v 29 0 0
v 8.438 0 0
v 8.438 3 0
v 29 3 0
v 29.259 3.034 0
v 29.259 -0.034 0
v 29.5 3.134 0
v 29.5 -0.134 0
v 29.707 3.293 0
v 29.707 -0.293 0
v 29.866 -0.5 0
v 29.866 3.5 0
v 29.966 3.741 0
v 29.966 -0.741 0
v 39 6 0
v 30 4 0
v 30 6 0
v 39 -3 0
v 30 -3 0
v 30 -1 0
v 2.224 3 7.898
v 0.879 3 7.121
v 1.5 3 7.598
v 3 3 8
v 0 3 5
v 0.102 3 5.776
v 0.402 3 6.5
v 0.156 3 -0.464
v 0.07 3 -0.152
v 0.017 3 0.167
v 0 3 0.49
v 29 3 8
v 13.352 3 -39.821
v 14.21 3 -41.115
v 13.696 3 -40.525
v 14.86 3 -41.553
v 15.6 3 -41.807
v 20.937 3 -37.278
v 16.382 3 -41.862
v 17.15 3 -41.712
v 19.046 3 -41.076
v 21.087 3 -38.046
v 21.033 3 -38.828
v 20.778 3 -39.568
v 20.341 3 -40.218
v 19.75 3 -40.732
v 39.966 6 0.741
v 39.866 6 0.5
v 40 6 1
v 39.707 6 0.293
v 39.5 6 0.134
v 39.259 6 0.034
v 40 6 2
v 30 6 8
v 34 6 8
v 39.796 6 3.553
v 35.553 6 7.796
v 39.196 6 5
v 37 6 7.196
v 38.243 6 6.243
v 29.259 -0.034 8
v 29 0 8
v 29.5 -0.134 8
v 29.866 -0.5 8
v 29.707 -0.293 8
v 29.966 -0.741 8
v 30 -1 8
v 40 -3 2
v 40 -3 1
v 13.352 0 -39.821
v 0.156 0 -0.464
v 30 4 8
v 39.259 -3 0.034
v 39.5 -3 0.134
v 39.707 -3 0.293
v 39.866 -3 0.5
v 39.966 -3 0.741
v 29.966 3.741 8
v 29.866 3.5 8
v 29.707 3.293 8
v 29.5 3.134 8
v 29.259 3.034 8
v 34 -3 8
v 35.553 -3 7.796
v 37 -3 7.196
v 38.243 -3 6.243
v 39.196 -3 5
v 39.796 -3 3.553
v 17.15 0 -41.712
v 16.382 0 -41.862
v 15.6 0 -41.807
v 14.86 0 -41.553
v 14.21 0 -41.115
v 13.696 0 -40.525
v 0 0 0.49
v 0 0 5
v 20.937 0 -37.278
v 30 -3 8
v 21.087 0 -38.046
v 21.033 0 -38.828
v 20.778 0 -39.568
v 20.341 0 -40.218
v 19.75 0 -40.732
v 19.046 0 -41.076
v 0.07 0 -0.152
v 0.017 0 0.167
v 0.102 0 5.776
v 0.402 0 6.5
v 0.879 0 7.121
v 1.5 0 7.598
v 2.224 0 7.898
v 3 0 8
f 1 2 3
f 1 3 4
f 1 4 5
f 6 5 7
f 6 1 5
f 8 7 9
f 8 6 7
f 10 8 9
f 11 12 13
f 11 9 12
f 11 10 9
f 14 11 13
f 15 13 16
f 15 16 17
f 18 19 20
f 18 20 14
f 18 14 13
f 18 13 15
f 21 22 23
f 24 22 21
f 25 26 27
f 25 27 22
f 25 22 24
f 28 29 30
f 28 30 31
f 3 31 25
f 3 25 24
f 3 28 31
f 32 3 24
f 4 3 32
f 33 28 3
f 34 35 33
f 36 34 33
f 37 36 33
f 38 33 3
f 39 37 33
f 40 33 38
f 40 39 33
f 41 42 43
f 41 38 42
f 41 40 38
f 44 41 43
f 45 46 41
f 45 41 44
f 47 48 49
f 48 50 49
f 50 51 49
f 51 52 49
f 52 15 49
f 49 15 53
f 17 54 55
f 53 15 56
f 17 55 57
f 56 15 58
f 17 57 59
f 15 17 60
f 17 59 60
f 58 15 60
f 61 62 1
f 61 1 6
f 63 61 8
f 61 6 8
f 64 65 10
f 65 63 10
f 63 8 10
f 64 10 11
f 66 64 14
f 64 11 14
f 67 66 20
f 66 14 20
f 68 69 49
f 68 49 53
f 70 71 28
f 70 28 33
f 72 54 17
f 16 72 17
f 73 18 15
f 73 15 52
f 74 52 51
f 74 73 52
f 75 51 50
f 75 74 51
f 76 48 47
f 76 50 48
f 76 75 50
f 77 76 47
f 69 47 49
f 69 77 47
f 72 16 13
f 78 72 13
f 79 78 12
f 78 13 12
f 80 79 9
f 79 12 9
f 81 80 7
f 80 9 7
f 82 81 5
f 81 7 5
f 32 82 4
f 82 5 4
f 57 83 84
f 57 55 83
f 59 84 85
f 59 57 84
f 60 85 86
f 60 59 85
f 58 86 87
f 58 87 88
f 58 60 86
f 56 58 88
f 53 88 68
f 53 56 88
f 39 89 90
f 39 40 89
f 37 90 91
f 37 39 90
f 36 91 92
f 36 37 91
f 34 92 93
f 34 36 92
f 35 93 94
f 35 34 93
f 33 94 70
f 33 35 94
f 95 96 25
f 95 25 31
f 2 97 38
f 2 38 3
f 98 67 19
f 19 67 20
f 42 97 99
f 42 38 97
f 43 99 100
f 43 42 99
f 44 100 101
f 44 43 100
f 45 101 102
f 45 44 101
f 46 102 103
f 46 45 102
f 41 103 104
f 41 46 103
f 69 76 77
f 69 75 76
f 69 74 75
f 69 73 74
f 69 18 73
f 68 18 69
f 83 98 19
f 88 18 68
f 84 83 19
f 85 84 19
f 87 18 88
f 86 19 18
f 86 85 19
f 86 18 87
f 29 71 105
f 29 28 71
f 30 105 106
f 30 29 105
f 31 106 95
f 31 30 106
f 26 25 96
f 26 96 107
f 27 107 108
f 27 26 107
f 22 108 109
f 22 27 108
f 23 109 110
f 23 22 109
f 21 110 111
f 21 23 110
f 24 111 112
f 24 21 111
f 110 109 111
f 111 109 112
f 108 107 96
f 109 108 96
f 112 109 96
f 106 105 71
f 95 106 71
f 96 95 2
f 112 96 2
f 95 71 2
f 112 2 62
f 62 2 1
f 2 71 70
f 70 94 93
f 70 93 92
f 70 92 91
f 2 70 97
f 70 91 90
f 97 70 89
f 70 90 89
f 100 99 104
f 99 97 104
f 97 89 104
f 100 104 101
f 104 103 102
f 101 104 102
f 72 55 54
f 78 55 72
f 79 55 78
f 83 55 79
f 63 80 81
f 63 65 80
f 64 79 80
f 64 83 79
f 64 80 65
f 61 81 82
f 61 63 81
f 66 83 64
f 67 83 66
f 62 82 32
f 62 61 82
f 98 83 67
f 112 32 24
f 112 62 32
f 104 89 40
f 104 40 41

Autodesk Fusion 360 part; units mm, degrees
sketch "Sketch1" plane through (0, 0, 0) normal (0, 1, 0) x (1, 0, 0)
  line L0 (0, 0) -> (40, 0)
  line L1 (40, 0) -> (40, -8)
  line L2 (40, -8) -> (0, -8)
  line L3 (0, -8) -> (0, 0)
  line L4 (0, 0) -> (14.3059, 42.6654)
  line L5 (14.3059, 42.6654) -> (21.8909, 40.1222)
  line L6 (21.8909, 40.1222) -> (8.4377, 0)
  dimension "d1" = 40
  dimension "d2" = 8
  dimension "d4" = 8
  dimension "d5" = 71.463
  dimension "d9" = 45
extrude "Extrude3" add sketch "Sketch1" along normal blind 3
fillet "Fillet8" radius 3 4 edges at (0, 1.5, 8) (0, 1.5, 0) (14.3059, 1.5, -42.6654) (21.8909, 1.5, -40.1222)
sketch "Sketch4" plane through (0, 0, 0) normal (0, -1, 0) x (1, 0, 0)
  arc A0 (19.0465, -41.0759) -> (20.9372, -37.2778) centre (18.0928, -38.2315) ccw
  line L0 (20.9372, -37.2778) -> (8.4377, 0)
  line L1 (8.4377, 0) -> (40, 0)
  line L2 (40, 0) -> (40, 8)
  line L3 (40, 8) -> (3, 8)
  arc A1 (3, 8) -> (0, 5) centre (3, 5) ccw
  line L4 (0, 5) -> (0, 0.4896)
  arc A2 (0, 0.4896) -> (0.1556, -0.4642) centre (3, 0.4896) ccw
  line L5 (0.1556, -0.4642) -> (13.3522, -39.8211)
  arc A3 (13.3522, -39.8211) -> (17.1503, -41.7117) centre (16.1966, -38.8674) ccw
  line L6 (17.1503, -41.7117) -> (19.0465, -41.0759)
  line L7 (40, 8) -> (30, 8)
  line L8 (30, 8) -> (30, 0)
  line L9 (30, 0) -> (40, 0)
  line L10 (40, 0) -> (40, 8)
  dimension "d26" = 10
extrude "Extrude4" add sketch "Sketch4" along normal blind 3 and the other way blind 6 contours L1 L2 L3 L7 L8 L9 L10
fillet "Fillet9" radius 6 1 edges at (40, 1.5, 8)
fillet "Fillet10" radius 1 1 edges at (40, 1.5, 0)
fillet "Fillet11" radius 1 2 edges at (30, 0, 4) (30, 3, 4)
extrude "Extrude1" [suppressed]
moveface "MoveFace1" [suppressed]
fillet "Fillet1" [suppressed]
fillet "Fillet2" [suppressed]
sketch "Sketch2" plane through (0, 0, 0) normal (0, 1, 0) x (1, 0, 0)
  line L0 (40, -8) -> (31, -8)
  line L1 (31, -8) -> (31, 0)
  line L2 (31, 0) -> (40, 0)
  line L3 (40, 0) -> (40, -8)
  line L4 (40, 0) -> (40, -8)
  dimension "d12" = 9
  dimension "d13" = 8
extrude "Extrude2" [suppressed]
fillet "Fillet3" [suppressed]
fillet "Fillet4" [suppressed]
fillet "Fillet5" [suppressed]
sketch "Sketch3" plane through (0, 0, 0) normal (0, 1, 0) x (1, 0, 0)
delete_face "DeleteFace1" [suppressed]
fillet "Fillet6" [suppressed]
delete_face "DeleteFace2" [suppressed]
fillet "Fillet7" [suppressed]
